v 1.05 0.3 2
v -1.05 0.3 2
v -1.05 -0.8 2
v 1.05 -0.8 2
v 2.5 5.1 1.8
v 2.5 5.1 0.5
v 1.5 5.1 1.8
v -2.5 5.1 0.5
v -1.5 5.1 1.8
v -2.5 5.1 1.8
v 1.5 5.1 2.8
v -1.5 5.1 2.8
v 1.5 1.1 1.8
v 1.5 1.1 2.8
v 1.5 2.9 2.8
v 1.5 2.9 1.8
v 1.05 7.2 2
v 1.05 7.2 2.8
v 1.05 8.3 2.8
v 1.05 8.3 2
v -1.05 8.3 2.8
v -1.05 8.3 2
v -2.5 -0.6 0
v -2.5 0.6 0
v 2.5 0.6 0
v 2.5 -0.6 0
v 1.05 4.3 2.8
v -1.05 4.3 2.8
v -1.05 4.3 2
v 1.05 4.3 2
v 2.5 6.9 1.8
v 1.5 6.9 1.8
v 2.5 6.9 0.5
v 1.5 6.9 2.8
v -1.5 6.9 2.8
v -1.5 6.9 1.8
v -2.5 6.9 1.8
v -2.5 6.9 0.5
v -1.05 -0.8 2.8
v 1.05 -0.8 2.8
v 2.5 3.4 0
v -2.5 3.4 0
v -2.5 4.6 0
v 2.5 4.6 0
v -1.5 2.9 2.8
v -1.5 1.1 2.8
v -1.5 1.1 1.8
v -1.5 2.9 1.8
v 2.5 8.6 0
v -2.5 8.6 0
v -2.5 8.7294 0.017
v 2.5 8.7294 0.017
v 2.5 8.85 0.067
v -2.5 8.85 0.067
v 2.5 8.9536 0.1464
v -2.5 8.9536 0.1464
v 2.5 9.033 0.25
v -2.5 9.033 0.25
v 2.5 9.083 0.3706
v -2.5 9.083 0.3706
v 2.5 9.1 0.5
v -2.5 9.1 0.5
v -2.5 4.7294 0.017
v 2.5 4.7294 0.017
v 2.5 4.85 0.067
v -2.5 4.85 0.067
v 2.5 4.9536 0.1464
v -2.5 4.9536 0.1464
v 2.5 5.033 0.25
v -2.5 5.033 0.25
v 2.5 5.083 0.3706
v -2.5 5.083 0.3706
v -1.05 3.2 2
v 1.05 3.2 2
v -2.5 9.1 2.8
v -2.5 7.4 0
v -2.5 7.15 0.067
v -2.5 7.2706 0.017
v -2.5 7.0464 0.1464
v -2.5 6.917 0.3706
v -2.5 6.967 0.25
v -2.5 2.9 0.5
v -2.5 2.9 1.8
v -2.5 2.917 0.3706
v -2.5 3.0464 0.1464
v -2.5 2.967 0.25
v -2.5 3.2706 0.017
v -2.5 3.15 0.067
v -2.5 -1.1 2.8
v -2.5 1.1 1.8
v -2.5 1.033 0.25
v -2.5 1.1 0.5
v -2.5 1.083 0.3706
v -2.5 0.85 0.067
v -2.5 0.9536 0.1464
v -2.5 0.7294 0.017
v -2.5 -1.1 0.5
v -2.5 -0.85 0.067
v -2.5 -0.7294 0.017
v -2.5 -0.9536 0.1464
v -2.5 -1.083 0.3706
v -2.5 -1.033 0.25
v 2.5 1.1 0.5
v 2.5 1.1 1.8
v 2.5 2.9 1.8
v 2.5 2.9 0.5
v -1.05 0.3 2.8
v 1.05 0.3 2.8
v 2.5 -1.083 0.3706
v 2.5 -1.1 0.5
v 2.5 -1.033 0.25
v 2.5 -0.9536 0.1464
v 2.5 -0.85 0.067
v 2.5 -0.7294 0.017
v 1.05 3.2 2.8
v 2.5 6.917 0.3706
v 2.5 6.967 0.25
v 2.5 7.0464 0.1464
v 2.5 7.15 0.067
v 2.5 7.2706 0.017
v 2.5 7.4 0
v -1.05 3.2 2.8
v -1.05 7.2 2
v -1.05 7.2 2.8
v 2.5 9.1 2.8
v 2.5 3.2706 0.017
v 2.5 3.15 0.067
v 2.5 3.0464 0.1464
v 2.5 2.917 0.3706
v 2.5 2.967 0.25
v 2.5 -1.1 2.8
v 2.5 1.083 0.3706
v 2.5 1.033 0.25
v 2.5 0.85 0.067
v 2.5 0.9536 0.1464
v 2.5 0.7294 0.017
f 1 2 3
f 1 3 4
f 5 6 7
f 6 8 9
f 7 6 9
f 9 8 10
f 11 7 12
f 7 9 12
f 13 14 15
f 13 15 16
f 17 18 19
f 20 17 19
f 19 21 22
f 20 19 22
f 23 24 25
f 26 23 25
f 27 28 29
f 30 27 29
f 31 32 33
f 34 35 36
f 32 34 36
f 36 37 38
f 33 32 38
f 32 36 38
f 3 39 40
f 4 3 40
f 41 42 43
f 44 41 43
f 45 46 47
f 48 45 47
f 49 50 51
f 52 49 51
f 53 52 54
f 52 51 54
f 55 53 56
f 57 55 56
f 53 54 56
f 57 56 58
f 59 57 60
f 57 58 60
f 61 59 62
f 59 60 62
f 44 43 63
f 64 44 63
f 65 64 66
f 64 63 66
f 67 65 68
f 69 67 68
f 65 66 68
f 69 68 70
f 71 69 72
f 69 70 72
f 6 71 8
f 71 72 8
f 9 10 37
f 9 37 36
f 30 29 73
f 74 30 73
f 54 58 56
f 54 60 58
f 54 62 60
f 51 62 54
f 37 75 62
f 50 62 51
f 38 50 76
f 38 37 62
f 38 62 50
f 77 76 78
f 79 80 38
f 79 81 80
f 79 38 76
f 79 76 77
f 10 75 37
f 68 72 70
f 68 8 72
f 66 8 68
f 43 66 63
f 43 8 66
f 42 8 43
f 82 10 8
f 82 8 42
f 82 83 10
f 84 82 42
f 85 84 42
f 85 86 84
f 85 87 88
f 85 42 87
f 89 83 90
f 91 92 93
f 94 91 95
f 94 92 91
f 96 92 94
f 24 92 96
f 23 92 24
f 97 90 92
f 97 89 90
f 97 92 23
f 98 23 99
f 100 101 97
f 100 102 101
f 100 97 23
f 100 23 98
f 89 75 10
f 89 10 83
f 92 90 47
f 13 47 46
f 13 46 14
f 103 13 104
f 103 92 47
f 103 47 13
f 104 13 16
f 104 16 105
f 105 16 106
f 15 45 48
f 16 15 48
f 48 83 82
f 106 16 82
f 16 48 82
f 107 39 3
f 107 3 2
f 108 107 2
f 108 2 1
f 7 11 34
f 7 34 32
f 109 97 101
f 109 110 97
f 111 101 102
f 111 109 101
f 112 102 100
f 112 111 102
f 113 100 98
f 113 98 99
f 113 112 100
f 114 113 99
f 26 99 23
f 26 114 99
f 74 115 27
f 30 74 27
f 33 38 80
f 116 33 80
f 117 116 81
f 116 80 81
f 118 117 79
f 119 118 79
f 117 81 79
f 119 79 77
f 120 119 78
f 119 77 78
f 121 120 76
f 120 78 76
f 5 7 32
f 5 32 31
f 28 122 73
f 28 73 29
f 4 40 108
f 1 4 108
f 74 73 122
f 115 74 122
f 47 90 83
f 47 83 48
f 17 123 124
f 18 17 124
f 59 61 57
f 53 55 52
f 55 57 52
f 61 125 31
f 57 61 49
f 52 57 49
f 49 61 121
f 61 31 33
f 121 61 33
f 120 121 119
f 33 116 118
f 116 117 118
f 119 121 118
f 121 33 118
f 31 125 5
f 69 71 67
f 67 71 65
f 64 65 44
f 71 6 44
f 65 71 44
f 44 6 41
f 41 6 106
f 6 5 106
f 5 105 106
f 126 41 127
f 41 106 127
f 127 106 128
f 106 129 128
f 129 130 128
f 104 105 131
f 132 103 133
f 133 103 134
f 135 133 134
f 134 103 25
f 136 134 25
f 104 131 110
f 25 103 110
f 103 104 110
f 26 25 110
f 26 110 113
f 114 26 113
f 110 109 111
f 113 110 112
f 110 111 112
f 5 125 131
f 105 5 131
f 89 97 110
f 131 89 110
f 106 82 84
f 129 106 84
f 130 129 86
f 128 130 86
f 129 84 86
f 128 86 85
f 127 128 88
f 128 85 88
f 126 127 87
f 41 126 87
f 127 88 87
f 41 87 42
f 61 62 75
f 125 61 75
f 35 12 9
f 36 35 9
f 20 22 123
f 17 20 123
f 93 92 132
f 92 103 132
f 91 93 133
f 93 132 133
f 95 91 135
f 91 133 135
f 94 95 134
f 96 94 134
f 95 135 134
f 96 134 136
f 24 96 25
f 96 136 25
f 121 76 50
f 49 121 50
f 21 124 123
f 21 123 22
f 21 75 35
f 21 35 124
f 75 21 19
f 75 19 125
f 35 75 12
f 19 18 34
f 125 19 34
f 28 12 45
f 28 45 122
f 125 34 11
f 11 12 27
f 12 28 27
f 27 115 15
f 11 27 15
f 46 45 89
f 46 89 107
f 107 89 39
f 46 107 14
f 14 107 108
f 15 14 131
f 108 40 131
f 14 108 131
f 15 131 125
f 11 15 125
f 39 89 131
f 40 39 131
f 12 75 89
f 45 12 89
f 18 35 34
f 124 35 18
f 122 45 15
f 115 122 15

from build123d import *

# Parameters (mm, degrees)
SKETCH_1_W              = 5
SKETCH_1_H              = 2.2
EXTRUDE_1_DEPTH         = 2.8
SKETCH_2_W              = 2.1
SKETCH_2_H              = 1.1
CUT_EXTRUDE_1_DEPTH     = 0.8
FILLET_1_R              = 0.5
MOVE_START              = -2.5
MOVE_BODY_1_DEPTH       = 5
MOVE_BODY_1_2_OUTLINE_W = 1.1
MOVE_BODY_1_2_OUTLINE_H = 0.8
MOVE_BODY_1_2_DEPTH     = 1.45
MOVE_START_2            = 1.05
MOVE_BODY_1_3_OUTLINE_W = 1.1
MOVE_BODY_1_3_OUTLINE_H = 0.8
MOVE_BODY_1_3_DEPTH     = 1.45
MOVE_BODY_1_4_DEPTH     = 5
MOVE_BODY_1_5_OUTLINE_W = 1.1
MOVE_BODY_1_5_OUTLINE_H = 0.8
MOVE_BODY_1_5_DEPTH     = 1.45
MOVE_BODY_1_6_OUTLINE_W = 1.1
MOVE_BODY_1_6_OUTLINE_H = 0.8
MOVE_BODY_1_6_DEPTH     = 1.45
SKETCH_3_W              = 1
SKETCH_3_H              = 1
EXTRUDE_2_DEPTH         = 1.8
SKETCH_4_W              = 1
SKETCH_4_H              = 1
EXTRUDE_3_DEPTH         = 1.8


# Read off the part's stored shape, not the designer's step: 实体-移动/复制1
with BuildPart() as part:
    # 草图1 → 凸台-拉伸1 (new body)
    with BuildSketch(Plane.XY):
        Rectangle(SKETCH_1_W, SKETCH_1_H)
    extrude(amount=EXTRUDE_1_DEPTH)

    # 草图2 → 切除-拉伸1 (cut)
    with BuildSketch(Plane.XY.offset(2.8)):
        with Locations((0, -0.25)):
            Rectangle(SKETCH_2_W, SKETCH_2_H)
    extrude(amount=-CUT_EXTRUDE_1_DEPTH, mode=Mode.SUBTRACT)

    # 圆角1
    fillet_1_edges = [part.edges().sort_by_distance(p)[0] for p in [
        (0, -1.1, 0),
        (0, 1.1, 0),
    ]]
    fillet(fillet_1_edges, radius=FILLET_1_R)



with BuildPart() as body_2:
    # Move Body 1 outline → Move Body 1 (new body)
    with BuildSketch(Plane.YZ.offset(MOVE_START)):
        with BuildLine():
            Line((9.1, 0.5), (9.1, 2.8))
            Line((9.1, 2.8), (8.3, 2.8))
            Line((8.3, 2.8), (8.3, 2))
            Line((8.3, 2), (7.2, 2))
            Line((7.2, 2), (7.2, 2.8))
            Line((7.2, 2.8), (6.9, 2.8))
            Line((6.9, 2.8), (6.9, 0.5))
            ThreePointArc((6.9, 0.5), (7.046446609, 0.146446609), (7.4, 0))
            Line((7.4, 0), (8.6, 0))
            ThreePointArc((8.6, 0), (8.953553391, 0.146446609), (9.1, 0.5))
        make_face()
    extrude(amount=MOVE_BODY_1_DEPTH)

    # Move Body 1 2 outline → Move Body 1 2 (add)
    with BuildSketch(Plane.YZ.offset(MOVE_START)):
        with Locations((7.75, 2.4)):
            Rectangle(MOVE_BODY_1_2_OUTLINE_W, MOVE_BODY_1_2_OUTLINE_H)
    extrude(amount=MOVE_BODY_1_2_DEPTH)

    # Move Body 1 3 outline → Move Body 1 3 (add)
    with BuildSketch(Plane.YZ.offset(MOVE_START_2)):
        with Locations((7.75, 2.4)):
            Rectangle(MOVE_BODY_1_3_OUTLINE_W, MOVE_BODY_1_3_OUTLINE_H)
    extrude(amount=MOVE_BODY_1_3_DEPTH)


with BuildPart() as body_3:
    # Move Body 1 4 outline → Move Body 1 4 (new body)
    with BuildSketch(Plane.YZ.offset(MOVE_START)):
        with BuildLine():
            Line((5.1, 0.5), (5.1, 2.8))
            Line((5.1, 2.8), (4.3, 2.8))
            Line((4.3, 2.8), (4.3, 2))
            Line((4.3, 2), (3.2, 2))
            Line((3.2, 2), (3.2, 2.8))
            Line((3.2, 2.8), (2.9, 2.8))
            Line((2.9, 2.8), (2.9, 0.5))
            ThreePointArc((2.9, 0.5), (3.046446609, 0.146446609), (3.4, 0))
            Line((3.4, 0), (4.6, 0))
            ThreePointArc((4.6, 0), (4.953553391, 0.146446609), (5.1, 0.5))
        make_face()
    extrude(amount=MOVE_BODY_1_4_DEPTH)

    # Move Body 1 5 outline → Move Body 1 5 (add)
    with BuildSketch(Plane.YZ.offset(MOVE_START)):
        with Locations((3.75, 2.4)):
            Rectangle(MOVE_BODY_1_5_OUTLINE_W, MOVE_BODY_1_5_OUTLINE_H)
    extrude(amount=MOVE_BODY_1_5_DEPTH)

    # Move Body 1 6 outline → Move Body 1 6 (add)
    with BuildSketch(Plane.YZ.offset(MOVE_START_2)):
        with Locations((3.75, 2.4)):
            Rectangle(MOVE_BODY_1_6_OUTLINE_W, MOVE_BODY_1_6_OUTLINE_H)
    extrude(amount=MOVE_BODY_1_6_DEPTH)


with BuildPart() as part_1:
    add(part.part)

    add(body_3.part)  # 凸台-拉伸2 merges body 3
    # 草图3 → 凸台-拉伸2 (add)
    with BuildSketch(Plane(origin=(0, 1.1, 0), x_dir=(1, 0, 0), z_dir=(0, 1, 0))):
        with Locations((-2, -2.3)):
            Rectangle(SKETCH_3_W, SKETCH_3_H)
        with Locations((2, -2.3)):
            Rectangle(SKETCH_3_W, SKETCH_3_H)
    extrude(amount=EXTRUDE_2_DEPTH)


    add(body_2.part)  # 凸台-拉伸3 merges body 2
    # 草图4 → 凸台-拉伸3 (add)
    with BuildSketch(Plane(origin=(0, 5.1, 0), x_dir=(1, 0, 0), z_dir=(0, 1, 0))):
        with Locations((2, -2.3)):
            Rectangle(SKETCH_4_W, SKETCH_4_H)
        with Locations((-2, -2.3)):
            Rectangle(SKETCH_4_W, SKETCH_4_H)
    extrude(amount=EXTRUDE_3_DEPTH)


solid = part_1.part
